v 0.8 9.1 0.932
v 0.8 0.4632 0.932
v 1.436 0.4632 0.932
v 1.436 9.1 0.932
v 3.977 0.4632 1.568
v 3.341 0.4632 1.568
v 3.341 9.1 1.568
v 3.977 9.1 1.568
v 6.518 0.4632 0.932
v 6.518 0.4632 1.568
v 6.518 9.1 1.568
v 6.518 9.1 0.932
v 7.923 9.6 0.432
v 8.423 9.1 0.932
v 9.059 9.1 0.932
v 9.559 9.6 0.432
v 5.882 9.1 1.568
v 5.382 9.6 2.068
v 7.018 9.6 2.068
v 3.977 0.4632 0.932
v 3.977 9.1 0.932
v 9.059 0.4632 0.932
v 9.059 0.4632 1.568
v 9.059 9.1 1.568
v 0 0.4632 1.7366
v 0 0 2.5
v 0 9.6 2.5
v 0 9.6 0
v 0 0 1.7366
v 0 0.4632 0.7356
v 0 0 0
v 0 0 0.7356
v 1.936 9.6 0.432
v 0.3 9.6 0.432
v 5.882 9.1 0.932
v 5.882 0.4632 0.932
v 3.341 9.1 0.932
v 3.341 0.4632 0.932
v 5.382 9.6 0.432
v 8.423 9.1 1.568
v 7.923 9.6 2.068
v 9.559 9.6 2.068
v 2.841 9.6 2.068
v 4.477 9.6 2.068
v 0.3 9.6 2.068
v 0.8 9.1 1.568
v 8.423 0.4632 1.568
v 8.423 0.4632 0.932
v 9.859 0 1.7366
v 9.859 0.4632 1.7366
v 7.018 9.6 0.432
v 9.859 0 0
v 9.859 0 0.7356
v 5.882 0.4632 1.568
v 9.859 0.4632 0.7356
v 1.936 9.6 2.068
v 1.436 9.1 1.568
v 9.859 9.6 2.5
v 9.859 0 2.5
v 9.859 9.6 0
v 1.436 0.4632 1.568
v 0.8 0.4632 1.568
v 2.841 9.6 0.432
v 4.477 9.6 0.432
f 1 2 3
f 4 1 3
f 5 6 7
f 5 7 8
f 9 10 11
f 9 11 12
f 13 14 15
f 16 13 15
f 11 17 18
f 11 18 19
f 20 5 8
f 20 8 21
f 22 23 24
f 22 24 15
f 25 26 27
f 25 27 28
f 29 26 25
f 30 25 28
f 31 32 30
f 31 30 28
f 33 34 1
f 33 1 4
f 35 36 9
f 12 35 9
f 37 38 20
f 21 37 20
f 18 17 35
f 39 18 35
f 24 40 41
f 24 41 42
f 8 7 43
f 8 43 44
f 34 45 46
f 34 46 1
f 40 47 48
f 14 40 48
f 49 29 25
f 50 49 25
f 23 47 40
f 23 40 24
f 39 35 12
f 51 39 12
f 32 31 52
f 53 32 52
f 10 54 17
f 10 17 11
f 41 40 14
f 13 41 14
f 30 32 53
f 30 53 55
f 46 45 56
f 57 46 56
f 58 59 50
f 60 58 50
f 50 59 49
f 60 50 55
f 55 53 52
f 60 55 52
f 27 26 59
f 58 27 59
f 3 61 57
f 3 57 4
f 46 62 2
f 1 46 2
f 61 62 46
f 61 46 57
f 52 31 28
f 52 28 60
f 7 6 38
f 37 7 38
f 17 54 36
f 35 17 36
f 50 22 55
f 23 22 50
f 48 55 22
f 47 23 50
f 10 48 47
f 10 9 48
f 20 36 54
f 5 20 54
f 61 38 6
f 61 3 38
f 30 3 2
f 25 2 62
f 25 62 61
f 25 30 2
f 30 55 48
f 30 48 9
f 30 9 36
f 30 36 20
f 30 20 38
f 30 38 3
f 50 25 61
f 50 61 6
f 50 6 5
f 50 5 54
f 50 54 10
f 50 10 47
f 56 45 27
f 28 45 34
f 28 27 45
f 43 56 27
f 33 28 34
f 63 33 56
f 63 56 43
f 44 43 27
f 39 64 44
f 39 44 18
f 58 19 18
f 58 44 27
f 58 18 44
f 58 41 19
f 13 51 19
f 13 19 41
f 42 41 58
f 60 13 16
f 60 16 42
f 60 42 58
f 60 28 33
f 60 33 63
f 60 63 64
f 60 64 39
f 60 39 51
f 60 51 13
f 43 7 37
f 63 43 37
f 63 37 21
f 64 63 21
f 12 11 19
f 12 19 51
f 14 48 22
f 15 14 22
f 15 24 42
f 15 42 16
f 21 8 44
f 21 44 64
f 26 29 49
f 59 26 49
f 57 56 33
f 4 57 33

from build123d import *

# Parameters (mm, degrees)
CROQUIS1_W              = 9.859
CROQUIS1_H              = 2.5
CROQUIS1_W_2            = 0.636
CROQUIS1_H_2            = 0.636
SALIENTE_EXTRUIR2_DEPTH = 9.6
CHAFL_N2_SIZE           = 0.5
CHAFL_N3_SIZE           = 0.5
CROQUIS2_W              = 1.000954756
CROQUIS2_H              = 0.463176593
CORTAR_EXTRUIR1_DEPTH   = 10.859


with BuildPart() as part:
    # Croquis1 → Saliente-Extruir2 (new body)
    with BuildSketch(Plane(origin=(0, 0, 0), x_dir=(1, 0, 0), z_dir=(0, 1, 0))):
        with Locations((4.9295, -1.25)):
            Rectangle(CROQUIS1_W, CROQUIS1_H)
        with Locations((1.118, -1.25)):
            Rectangle(CROQUIS1_W_2, CROQUIS1_H_2, mode=Mode.SUBTRACT)
        with Locations((3.659, -1.25)):
            Rectangle(CROQUIS1_W_2, CROQUIS1_H_2, mode=Mode.SUBTRACT)
        with Locations((8.741, -1.25)):
            Rectangle(CROQUIS1_W_2, CROQUIS1_H_2, mode=Mode.SUBTRACT)
        with Locations((6.2, -1.25)):
            Rectangle(CROQUIS1_W_2, CROQUIS1_H_2, mode=Mode.SUBTRACT)
    extrude(amount=SALIENTE_EXTRUIR2_DEPTH)

    # Chaflán2
    chafl_n2_edges = [part.edges().sort_by_distance(p)[0] for p in [
        (0.8, 9.6, 1.25),
        (1.118, 9.6, 1.568),
        (1.436, 9.6, 1.25),
        (1.118, 9.6, 0.932),
    ]]
    chamfer(chafl_n2_edges, length=CHAFL_N2_SIZE)

    # Chaflán3
    chafl_n3_edges = [part.edges().sort_by_distance(p)[0] for p in [
        (3.659, 9.6, 0.932),
        (3.341, 9.6, 1.25),
        (3.659, 9.6, 1.568),
        (3.977, 9.6, 1.25),
        (8.741, 9.6, 0.932),
        (8.423, 9.6, 1.25),
        (8.741, 9.6, 1.568),
        (9.059, 9.6, 1.25),
        (6.2, 9.6, 0.932),
        (5.882, 9.6, 1.25),
        (6.2, 9.6, 1.568),
        (6.518, 9.6, 1.25),
    ]]
    chamfer(chafl_n3_edges, length=CHAFL_N3_SIZE)

    # Croquis2 → Cortar-Extruir1 (cut, through all)
    with BuildSketch(Plane.ZY):
        with Locations((1.236111308, 0.231588297)):
            Rectangle(CROQUIS2_W, CROQUIS2_H)
    extrude(amount=-CORTAR_EXTRUIR1_DEPTH, mode=Mode.SUBTRACT)


solid = part.part
